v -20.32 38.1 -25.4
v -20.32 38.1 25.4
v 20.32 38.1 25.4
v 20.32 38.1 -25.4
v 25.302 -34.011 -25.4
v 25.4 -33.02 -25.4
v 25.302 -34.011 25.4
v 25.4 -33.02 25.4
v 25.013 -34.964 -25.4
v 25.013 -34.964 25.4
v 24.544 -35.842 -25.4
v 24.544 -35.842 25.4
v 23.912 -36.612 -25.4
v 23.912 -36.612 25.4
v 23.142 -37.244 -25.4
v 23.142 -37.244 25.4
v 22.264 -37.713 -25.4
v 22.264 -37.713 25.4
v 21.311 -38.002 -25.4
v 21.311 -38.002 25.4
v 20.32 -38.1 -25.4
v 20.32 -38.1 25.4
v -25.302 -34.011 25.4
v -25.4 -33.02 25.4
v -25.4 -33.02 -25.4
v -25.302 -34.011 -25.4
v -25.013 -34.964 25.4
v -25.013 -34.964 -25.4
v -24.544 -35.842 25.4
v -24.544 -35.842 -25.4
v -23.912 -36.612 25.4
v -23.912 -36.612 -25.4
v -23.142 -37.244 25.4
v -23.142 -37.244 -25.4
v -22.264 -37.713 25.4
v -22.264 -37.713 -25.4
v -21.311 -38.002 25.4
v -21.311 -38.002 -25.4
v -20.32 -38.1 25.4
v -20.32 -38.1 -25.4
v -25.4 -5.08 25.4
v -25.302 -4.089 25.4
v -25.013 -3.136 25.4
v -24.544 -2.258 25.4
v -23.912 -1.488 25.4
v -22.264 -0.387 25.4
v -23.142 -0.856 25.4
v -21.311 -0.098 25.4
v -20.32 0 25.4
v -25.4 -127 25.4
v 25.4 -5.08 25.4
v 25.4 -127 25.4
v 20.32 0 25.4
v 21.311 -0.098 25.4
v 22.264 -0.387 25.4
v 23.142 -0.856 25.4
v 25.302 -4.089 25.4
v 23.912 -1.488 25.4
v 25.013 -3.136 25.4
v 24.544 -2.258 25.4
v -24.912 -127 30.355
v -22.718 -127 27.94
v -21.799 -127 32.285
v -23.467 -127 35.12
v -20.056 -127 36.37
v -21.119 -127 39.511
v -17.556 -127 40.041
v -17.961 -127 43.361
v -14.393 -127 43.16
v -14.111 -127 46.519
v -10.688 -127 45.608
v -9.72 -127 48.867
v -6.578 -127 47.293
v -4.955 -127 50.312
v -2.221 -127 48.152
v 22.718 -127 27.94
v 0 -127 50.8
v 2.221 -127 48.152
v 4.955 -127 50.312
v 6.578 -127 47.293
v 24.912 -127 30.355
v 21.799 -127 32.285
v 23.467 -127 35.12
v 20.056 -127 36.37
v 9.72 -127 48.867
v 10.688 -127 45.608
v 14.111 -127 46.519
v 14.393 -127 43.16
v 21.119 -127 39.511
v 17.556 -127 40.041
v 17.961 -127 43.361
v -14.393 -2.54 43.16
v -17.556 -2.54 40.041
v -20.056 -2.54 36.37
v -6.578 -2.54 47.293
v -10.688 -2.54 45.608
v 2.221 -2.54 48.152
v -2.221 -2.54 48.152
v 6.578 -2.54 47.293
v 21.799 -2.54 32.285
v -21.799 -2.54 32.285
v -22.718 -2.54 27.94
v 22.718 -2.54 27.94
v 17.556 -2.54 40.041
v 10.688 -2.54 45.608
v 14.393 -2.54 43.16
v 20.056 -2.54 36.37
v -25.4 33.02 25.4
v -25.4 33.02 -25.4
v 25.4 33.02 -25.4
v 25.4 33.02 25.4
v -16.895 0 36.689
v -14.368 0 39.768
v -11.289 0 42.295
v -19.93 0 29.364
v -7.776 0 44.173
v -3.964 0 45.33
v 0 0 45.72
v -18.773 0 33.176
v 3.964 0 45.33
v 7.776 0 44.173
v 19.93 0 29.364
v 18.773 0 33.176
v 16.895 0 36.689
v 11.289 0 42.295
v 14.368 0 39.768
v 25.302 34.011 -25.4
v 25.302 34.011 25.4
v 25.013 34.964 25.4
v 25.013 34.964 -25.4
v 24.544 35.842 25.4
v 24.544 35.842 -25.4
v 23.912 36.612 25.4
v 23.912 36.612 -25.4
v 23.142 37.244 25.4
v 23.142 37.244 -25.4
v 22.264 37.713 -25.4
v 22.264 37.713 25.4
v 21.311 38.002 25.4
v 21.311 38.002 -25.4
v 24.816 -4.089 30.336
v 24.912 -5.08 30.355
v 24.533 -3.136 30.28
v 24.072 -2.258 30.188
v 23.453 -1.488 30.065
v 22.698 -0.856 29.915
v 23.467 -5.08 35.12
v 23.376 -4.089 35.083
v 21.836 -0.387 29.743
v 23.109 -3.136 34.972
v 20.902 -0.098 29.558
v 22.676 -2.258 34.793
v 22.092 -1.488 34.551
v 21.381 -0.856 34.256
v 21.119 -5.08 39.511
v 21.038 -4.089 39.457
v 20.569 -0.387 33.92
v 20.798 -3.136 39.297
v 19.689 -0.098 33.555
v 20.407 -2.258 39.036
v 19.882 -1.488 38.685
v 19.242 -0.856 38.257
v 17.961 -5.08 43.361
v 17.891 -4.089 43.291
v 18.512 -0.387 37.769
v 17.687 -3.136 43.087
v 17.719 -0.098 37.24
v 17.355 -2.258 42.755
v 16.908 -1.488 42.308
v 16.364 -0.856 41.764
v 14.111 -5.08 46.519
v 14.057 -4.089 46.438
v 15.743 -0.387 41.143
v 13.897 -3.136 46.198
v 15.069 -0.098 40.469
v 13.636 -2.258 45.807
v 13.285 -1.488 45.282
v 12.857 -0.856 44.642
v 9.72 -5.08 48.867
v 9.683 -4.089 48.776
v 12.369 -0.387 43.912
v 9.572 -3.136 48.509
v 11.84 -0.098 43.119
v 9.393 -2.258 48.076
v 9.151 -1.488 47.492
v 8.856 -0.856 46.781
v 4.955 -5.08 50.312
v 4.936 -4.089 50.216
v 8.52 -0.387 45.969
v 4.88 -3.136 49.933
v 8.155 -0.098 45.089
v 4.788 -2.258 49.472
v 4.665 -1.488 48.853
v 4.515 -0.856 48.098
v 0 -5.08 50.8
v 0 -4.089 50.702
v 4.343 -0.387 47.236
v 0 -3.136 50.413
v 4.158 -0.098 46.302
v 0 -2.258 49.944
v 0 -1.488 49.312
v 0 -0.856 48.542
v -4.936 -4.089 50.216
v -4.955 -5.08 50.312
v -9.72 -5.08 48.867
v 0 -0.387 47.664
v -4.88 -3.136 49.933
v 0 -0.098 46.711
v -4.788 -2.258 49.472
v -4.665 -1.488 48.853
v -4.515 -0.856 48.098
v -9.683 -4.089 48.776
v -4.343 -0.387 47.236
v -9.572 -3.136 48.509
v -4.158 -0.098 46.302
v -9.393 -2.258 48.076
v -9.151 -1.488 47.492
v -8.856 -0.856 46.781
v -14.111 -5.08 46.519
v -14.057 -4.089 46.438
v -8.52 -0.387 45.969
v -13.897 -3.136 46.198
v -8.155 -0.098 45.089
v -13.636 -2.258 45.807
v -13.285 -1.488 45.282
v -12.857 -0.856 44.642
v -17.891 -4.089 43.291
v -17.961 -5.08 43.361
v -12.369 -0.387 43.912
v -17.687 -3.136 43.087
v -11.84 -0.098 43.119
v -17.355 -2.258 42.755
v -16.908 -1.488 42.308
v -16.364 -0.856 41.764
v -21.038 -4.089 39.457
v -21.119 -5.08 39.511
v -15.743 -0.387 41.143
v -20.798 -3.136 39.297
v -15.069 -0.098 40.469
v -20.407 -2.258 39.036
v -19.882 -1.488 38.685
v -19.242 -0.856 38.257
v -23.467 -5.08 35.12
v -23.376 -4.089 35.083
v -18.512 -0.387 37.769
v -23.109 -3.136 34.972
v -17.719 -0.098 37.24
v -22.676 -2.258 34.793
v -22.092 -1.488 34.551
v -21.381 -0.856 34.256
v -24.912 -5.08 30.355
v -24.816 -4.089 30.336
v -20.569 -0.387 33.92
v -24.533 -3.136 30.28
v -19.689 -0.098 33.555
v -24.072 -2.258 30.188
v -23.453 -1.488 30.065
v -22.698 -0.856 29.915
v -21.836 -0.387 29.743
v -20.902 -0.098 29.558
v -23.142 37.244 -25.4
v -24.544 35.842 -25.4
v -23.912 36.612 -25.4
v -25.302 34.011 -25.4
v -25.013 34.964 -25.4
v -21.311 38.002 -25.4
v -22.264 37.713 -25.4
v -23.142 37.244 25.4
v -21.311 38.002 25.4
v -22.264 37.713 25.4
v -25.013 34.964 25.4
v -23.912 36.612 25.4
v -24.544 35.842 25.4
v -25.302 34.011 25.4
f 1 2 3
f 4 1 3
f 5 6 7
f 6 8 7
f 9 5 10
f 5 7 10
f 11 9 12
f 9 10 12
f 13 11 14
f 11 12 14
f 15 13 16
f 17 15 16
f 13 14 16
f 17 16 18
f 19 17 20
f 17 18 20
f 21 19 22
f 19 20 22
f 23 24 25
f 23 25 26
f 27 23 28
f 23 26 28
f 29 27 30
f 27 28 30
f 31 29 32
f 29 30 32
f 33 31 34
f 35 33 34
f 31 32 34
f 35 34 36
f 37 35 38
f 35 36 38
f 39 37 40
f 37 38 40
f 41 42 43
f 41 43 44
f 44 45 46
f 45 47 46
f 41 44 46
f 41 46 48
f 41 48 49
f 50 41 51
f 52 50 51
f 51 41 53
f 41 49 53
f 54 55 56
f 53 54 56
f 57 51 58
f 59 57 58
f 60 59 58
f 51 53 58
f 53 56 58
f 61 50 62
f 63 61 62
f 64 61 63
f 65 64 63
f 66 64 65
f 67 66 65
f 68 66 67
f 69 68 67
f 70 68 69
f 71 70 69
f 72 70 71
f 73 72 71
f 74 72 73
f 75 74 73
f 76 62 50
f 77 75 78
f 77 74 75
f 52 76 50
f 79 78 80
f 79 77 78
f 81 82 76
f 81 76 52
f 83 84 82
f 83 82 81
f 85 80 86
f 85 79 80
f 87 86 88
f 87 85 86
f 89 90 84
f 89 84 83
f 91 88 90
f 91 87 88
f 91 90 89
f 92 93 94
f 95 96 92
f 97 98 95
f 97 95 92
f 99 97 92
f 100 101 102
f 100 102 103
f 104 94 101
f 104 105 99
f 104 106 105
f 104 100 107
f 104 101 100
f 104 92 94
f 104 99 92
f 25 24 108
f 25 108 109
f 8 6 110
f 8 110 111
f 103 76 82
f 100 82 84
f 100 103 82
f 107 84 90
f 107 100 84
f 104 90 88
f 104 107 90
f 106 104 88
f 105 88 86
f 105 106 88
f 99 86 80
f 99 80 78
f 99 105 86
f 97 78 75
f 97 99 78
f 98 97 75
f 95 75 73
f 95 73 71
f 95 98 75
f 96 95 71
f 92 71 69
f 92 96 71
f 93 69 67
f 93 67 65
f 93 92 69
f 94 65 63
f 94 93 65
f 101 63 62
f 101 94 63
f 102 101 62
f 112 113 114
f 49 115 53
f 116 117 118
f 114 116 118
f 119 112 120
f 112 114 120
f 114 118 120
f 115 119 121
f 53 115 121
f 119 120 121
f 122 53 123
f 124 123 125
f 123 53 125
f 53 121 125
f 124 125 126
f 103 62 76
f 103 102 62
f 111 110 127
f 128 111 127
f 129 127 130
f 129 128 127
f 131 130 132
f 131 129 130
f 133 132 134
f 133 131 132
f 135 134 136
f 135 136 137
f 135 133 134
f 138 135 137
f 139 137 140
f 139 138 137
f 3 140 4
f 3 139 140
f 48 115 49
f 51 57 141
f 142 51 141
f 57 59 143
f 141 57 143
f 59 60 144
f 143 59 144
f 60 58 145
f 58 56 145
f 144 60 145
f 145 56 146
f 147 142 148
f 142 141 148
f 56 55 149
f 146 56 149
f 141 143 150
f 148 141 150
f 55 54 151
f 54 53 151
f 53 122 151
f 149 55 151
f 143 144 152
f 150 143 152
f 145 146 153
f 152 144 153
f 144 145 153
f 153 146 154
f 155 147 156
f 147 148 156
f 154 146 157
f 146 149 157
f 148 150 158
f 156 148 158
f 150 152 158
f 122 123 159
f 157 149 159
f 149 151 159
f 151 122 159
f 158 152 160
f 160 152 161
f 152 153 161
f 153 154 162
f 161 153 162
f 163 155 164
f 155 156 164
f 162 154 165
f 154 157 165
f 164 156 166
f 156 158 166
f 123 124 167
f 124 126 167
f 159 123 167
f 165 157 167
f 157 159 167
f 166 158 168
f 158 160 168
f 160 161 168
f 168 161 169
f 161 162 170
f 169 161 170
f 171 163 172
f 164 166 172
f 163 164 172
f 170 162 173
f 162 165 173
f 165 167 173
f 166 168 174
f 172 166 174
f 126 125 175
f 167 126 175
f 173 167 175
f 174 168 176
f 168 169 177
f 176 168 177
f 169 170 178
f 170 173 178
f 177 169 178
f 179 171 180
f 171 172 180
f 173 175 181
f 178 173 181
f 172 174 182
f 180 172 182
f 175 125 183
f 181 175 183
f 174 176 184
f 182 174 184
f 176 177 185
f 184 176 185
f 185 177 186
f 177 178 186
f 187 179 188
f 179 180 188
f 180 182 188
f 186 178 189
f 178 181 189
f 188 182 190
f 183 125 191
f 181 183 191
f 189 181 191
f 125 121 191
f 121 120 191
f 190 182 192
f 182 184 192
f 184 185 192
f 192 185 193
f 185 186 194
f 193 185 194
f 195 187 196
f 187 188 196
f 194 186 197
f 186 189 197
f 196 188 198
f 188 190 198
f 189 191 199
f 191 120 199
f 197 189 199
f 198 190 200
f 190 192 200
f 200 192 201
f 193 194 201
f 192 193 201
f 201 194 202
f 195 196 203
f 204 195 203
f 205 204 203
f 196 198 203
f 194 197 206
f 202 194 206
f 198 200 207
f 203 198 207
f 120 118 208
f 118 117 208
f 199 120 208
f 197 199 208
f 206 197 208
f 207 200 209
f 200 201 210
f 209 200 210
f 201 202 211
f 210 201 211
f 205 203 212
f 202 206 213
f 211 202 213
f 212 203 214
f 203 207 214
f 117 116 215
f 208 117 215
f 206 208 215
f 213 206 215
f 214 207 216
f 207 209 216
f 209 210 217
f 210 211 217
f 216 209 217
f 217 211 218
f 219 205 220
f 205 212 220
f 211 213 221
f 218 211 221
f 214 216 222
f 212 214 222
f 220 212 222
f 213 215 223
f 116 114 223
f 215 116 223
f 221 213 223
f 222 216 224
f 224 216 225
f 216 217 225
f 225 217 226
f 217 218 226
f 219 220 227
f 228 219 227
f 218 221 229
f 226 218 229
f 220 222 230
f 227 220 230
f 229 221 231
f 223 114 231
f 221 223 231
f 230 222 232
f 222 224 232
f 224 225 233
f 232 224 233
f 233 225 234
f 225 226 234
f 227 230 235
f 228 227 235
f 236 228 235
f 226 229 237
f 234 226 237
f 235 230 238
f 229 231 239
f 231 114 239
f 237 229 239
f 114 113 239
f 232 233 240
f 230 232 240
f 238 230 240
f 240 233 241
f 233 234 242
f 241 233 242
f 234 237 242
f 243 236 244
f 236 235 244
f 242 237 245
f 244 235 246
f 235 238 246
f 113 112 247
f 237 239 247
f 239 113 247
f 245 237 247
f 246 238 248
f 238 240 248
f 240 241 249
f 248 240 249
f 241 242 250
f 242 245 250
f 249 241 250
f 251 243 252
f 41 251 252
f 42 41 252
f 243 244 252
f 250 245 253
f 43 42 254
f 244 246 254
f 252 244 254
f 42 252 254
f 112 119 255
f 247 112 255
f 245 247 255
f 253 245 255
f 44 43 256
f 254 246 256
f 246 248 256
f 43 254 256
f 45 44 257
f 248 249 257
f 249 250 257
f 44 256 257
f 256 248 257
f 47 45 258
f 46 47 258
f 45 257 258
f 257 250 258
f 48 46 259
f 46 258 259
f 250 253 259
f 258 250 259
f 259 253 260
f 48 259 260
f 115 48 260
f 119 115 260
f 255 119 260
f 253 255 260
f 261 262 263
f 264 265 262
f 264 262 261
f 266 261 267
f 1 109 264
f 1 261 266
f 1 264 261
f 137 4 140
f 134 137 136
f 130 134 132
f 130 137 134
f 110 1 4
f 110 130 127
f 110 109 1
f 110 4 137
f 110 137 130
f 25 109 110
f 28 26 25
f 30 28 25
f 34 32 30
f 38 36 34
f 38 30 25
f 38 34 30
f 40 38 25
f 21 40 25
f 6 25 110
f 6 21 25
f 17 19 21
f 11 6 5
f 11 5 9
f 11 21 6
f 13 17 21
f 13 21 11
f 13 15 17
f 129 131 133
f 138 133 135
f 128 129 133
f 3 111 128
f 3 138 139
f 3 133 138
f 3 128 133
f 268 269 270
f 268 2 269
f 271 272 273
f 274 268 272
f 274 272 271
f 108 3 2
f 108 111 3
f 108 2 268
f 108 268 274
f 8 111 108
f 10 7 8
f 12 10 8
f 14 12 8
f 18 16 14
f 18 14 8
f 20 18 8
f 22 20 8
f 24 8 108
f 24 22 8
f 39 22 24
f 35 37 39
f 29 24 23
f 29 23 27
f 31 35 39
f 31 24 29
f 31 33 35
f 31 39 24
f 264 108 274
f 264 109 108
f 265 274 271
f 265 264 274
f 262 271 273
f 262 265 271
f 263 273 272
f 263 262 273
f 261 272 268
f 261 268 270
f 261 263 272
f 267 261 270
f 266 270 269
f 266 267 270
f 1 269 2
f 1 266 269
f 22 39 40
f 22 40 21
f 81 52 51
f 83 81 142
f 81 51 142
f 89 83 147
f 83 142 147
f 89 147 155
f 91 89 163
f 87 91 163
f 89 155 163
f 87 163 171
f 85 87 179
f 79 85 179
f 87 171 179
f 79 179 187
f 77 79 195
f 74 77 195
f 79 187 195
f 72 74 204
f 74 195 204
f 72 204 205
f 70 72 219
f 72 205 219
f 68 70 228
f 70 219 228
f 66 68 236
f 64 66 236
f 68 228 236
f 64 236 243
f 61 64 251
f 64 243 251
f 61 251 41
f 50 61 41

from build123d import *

# Parameters (mm, degrees)
F1_DEPTH = 38.1
F2_DEPTH = 127
F3_T     = -2.54
F4_R     = 5.08
F4_2_R   = 5.08


with BuildPart() as f1:
    # F0 (on Front) → F1 (new body, symmetric)
    with BuildSketch(Plane.XZ):
        with BuildLine():
            Line((25.4, -25.4), (25.4, 25.4))
            ThreePointArc((25.4, 25.4), (0, 0), (-25.4, 25.4))
            Line((-25.4, 25.4), (-25.4, -25.4))
            Line((-25.4, -25.4), (25.4, -25.4))
        make_face()
        with BuildLine():
            ThreePointArc((-25.4, 25.4), (0, 0), (25.4, 25.4))
            Line((25.4, 25.4), (-25.4, 25.4))
        make_face()
    extrude(amount=F1_DEPTH, both=True)

    # F4
    f4_edges = [f1.edges().sort_by_distance(p)[0] for p in [
        (-25.4, -38.1, 0),
        (25.4, -38.1, 0),
        (25.4, 38.1, 0),
        (-25.4, 38.1, 0),
    ]]
    fillet(f4_edges, radius=F4_R)


with BuildPart() as f2:
    # F0 (on Front) → F2 (new body)
    with BuildSketch(Plane.XZ):
        with BuildLine():
            Line((-25.4, 25.4), (25.4, 25.4))
            ThreePointArc((25.4, 25.4), (0, 50.8), (-25.4, 25.4))
        make_face()
    extrude(amount=F2_DEPTH)

    # F3
    f3_openings = [f2.faces().sort_by_distance(p)[0] for p in [
        (0, -127, 36.180095),
    ]]
    offset(amount=F3_T, openings=f3_openings)

    # F4#2
    f4_2_edges = [f2.edges().sort_by_distance(p)[0] for p in [
        (0, 0, 50.8),
    ]]
    fillet(f4_2_edges, radius=F4_2_R)


solid = Compound([f1.part, f2.part])
